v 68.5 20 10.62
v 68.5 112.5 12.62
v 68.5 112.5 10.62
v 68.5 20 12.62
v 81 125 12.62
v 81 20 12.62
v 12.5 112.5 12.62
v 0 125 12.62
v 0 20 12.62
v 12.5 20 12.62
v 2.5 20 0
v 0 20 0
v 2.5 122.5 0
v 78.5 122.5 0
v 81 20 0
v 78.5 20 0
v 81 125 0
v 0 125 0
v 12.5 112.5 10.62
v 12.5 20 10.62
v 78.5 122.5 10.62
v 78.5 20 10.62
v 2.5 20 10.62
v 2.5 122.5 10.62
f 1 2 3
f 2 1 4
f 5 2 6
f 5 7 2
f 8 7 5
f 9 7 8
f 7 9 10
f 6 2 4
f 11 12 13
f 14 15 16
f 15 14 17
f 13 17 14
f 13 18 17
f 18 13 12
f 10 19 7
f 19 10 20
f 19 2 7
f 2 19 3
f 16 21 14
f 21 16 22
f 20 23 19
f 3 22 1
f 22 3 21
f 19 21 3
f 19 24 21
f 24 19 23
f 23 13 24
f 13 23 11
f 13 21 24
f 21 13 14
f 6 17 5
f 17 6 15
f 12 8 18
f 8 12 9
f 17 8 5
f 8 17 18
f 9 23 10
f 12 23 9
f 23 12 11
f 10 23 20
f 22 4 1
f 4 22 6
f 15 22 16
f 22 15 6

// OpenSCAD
// dimensions of the 3970X in mm
w = 76;
h = 7.62;
l = 120;

gap = 5;
hgap = 3;
shroud = 10;

// temporary split in half
difference(){

difference(){
	cube([w + gap, l + gap, h + gap]);
	union(){
		translate([gap / 2 + shroud, gap / 2 + shroud, 0]){
			cube([w - shroud * 2, l - shroud * 2, h + gap]);
		}
		translate([gap / 2, gap / 2, 0]){
			cube([w, l, h + hgap]);
		}
	}
}

cube([100, 20, 60]);

}
